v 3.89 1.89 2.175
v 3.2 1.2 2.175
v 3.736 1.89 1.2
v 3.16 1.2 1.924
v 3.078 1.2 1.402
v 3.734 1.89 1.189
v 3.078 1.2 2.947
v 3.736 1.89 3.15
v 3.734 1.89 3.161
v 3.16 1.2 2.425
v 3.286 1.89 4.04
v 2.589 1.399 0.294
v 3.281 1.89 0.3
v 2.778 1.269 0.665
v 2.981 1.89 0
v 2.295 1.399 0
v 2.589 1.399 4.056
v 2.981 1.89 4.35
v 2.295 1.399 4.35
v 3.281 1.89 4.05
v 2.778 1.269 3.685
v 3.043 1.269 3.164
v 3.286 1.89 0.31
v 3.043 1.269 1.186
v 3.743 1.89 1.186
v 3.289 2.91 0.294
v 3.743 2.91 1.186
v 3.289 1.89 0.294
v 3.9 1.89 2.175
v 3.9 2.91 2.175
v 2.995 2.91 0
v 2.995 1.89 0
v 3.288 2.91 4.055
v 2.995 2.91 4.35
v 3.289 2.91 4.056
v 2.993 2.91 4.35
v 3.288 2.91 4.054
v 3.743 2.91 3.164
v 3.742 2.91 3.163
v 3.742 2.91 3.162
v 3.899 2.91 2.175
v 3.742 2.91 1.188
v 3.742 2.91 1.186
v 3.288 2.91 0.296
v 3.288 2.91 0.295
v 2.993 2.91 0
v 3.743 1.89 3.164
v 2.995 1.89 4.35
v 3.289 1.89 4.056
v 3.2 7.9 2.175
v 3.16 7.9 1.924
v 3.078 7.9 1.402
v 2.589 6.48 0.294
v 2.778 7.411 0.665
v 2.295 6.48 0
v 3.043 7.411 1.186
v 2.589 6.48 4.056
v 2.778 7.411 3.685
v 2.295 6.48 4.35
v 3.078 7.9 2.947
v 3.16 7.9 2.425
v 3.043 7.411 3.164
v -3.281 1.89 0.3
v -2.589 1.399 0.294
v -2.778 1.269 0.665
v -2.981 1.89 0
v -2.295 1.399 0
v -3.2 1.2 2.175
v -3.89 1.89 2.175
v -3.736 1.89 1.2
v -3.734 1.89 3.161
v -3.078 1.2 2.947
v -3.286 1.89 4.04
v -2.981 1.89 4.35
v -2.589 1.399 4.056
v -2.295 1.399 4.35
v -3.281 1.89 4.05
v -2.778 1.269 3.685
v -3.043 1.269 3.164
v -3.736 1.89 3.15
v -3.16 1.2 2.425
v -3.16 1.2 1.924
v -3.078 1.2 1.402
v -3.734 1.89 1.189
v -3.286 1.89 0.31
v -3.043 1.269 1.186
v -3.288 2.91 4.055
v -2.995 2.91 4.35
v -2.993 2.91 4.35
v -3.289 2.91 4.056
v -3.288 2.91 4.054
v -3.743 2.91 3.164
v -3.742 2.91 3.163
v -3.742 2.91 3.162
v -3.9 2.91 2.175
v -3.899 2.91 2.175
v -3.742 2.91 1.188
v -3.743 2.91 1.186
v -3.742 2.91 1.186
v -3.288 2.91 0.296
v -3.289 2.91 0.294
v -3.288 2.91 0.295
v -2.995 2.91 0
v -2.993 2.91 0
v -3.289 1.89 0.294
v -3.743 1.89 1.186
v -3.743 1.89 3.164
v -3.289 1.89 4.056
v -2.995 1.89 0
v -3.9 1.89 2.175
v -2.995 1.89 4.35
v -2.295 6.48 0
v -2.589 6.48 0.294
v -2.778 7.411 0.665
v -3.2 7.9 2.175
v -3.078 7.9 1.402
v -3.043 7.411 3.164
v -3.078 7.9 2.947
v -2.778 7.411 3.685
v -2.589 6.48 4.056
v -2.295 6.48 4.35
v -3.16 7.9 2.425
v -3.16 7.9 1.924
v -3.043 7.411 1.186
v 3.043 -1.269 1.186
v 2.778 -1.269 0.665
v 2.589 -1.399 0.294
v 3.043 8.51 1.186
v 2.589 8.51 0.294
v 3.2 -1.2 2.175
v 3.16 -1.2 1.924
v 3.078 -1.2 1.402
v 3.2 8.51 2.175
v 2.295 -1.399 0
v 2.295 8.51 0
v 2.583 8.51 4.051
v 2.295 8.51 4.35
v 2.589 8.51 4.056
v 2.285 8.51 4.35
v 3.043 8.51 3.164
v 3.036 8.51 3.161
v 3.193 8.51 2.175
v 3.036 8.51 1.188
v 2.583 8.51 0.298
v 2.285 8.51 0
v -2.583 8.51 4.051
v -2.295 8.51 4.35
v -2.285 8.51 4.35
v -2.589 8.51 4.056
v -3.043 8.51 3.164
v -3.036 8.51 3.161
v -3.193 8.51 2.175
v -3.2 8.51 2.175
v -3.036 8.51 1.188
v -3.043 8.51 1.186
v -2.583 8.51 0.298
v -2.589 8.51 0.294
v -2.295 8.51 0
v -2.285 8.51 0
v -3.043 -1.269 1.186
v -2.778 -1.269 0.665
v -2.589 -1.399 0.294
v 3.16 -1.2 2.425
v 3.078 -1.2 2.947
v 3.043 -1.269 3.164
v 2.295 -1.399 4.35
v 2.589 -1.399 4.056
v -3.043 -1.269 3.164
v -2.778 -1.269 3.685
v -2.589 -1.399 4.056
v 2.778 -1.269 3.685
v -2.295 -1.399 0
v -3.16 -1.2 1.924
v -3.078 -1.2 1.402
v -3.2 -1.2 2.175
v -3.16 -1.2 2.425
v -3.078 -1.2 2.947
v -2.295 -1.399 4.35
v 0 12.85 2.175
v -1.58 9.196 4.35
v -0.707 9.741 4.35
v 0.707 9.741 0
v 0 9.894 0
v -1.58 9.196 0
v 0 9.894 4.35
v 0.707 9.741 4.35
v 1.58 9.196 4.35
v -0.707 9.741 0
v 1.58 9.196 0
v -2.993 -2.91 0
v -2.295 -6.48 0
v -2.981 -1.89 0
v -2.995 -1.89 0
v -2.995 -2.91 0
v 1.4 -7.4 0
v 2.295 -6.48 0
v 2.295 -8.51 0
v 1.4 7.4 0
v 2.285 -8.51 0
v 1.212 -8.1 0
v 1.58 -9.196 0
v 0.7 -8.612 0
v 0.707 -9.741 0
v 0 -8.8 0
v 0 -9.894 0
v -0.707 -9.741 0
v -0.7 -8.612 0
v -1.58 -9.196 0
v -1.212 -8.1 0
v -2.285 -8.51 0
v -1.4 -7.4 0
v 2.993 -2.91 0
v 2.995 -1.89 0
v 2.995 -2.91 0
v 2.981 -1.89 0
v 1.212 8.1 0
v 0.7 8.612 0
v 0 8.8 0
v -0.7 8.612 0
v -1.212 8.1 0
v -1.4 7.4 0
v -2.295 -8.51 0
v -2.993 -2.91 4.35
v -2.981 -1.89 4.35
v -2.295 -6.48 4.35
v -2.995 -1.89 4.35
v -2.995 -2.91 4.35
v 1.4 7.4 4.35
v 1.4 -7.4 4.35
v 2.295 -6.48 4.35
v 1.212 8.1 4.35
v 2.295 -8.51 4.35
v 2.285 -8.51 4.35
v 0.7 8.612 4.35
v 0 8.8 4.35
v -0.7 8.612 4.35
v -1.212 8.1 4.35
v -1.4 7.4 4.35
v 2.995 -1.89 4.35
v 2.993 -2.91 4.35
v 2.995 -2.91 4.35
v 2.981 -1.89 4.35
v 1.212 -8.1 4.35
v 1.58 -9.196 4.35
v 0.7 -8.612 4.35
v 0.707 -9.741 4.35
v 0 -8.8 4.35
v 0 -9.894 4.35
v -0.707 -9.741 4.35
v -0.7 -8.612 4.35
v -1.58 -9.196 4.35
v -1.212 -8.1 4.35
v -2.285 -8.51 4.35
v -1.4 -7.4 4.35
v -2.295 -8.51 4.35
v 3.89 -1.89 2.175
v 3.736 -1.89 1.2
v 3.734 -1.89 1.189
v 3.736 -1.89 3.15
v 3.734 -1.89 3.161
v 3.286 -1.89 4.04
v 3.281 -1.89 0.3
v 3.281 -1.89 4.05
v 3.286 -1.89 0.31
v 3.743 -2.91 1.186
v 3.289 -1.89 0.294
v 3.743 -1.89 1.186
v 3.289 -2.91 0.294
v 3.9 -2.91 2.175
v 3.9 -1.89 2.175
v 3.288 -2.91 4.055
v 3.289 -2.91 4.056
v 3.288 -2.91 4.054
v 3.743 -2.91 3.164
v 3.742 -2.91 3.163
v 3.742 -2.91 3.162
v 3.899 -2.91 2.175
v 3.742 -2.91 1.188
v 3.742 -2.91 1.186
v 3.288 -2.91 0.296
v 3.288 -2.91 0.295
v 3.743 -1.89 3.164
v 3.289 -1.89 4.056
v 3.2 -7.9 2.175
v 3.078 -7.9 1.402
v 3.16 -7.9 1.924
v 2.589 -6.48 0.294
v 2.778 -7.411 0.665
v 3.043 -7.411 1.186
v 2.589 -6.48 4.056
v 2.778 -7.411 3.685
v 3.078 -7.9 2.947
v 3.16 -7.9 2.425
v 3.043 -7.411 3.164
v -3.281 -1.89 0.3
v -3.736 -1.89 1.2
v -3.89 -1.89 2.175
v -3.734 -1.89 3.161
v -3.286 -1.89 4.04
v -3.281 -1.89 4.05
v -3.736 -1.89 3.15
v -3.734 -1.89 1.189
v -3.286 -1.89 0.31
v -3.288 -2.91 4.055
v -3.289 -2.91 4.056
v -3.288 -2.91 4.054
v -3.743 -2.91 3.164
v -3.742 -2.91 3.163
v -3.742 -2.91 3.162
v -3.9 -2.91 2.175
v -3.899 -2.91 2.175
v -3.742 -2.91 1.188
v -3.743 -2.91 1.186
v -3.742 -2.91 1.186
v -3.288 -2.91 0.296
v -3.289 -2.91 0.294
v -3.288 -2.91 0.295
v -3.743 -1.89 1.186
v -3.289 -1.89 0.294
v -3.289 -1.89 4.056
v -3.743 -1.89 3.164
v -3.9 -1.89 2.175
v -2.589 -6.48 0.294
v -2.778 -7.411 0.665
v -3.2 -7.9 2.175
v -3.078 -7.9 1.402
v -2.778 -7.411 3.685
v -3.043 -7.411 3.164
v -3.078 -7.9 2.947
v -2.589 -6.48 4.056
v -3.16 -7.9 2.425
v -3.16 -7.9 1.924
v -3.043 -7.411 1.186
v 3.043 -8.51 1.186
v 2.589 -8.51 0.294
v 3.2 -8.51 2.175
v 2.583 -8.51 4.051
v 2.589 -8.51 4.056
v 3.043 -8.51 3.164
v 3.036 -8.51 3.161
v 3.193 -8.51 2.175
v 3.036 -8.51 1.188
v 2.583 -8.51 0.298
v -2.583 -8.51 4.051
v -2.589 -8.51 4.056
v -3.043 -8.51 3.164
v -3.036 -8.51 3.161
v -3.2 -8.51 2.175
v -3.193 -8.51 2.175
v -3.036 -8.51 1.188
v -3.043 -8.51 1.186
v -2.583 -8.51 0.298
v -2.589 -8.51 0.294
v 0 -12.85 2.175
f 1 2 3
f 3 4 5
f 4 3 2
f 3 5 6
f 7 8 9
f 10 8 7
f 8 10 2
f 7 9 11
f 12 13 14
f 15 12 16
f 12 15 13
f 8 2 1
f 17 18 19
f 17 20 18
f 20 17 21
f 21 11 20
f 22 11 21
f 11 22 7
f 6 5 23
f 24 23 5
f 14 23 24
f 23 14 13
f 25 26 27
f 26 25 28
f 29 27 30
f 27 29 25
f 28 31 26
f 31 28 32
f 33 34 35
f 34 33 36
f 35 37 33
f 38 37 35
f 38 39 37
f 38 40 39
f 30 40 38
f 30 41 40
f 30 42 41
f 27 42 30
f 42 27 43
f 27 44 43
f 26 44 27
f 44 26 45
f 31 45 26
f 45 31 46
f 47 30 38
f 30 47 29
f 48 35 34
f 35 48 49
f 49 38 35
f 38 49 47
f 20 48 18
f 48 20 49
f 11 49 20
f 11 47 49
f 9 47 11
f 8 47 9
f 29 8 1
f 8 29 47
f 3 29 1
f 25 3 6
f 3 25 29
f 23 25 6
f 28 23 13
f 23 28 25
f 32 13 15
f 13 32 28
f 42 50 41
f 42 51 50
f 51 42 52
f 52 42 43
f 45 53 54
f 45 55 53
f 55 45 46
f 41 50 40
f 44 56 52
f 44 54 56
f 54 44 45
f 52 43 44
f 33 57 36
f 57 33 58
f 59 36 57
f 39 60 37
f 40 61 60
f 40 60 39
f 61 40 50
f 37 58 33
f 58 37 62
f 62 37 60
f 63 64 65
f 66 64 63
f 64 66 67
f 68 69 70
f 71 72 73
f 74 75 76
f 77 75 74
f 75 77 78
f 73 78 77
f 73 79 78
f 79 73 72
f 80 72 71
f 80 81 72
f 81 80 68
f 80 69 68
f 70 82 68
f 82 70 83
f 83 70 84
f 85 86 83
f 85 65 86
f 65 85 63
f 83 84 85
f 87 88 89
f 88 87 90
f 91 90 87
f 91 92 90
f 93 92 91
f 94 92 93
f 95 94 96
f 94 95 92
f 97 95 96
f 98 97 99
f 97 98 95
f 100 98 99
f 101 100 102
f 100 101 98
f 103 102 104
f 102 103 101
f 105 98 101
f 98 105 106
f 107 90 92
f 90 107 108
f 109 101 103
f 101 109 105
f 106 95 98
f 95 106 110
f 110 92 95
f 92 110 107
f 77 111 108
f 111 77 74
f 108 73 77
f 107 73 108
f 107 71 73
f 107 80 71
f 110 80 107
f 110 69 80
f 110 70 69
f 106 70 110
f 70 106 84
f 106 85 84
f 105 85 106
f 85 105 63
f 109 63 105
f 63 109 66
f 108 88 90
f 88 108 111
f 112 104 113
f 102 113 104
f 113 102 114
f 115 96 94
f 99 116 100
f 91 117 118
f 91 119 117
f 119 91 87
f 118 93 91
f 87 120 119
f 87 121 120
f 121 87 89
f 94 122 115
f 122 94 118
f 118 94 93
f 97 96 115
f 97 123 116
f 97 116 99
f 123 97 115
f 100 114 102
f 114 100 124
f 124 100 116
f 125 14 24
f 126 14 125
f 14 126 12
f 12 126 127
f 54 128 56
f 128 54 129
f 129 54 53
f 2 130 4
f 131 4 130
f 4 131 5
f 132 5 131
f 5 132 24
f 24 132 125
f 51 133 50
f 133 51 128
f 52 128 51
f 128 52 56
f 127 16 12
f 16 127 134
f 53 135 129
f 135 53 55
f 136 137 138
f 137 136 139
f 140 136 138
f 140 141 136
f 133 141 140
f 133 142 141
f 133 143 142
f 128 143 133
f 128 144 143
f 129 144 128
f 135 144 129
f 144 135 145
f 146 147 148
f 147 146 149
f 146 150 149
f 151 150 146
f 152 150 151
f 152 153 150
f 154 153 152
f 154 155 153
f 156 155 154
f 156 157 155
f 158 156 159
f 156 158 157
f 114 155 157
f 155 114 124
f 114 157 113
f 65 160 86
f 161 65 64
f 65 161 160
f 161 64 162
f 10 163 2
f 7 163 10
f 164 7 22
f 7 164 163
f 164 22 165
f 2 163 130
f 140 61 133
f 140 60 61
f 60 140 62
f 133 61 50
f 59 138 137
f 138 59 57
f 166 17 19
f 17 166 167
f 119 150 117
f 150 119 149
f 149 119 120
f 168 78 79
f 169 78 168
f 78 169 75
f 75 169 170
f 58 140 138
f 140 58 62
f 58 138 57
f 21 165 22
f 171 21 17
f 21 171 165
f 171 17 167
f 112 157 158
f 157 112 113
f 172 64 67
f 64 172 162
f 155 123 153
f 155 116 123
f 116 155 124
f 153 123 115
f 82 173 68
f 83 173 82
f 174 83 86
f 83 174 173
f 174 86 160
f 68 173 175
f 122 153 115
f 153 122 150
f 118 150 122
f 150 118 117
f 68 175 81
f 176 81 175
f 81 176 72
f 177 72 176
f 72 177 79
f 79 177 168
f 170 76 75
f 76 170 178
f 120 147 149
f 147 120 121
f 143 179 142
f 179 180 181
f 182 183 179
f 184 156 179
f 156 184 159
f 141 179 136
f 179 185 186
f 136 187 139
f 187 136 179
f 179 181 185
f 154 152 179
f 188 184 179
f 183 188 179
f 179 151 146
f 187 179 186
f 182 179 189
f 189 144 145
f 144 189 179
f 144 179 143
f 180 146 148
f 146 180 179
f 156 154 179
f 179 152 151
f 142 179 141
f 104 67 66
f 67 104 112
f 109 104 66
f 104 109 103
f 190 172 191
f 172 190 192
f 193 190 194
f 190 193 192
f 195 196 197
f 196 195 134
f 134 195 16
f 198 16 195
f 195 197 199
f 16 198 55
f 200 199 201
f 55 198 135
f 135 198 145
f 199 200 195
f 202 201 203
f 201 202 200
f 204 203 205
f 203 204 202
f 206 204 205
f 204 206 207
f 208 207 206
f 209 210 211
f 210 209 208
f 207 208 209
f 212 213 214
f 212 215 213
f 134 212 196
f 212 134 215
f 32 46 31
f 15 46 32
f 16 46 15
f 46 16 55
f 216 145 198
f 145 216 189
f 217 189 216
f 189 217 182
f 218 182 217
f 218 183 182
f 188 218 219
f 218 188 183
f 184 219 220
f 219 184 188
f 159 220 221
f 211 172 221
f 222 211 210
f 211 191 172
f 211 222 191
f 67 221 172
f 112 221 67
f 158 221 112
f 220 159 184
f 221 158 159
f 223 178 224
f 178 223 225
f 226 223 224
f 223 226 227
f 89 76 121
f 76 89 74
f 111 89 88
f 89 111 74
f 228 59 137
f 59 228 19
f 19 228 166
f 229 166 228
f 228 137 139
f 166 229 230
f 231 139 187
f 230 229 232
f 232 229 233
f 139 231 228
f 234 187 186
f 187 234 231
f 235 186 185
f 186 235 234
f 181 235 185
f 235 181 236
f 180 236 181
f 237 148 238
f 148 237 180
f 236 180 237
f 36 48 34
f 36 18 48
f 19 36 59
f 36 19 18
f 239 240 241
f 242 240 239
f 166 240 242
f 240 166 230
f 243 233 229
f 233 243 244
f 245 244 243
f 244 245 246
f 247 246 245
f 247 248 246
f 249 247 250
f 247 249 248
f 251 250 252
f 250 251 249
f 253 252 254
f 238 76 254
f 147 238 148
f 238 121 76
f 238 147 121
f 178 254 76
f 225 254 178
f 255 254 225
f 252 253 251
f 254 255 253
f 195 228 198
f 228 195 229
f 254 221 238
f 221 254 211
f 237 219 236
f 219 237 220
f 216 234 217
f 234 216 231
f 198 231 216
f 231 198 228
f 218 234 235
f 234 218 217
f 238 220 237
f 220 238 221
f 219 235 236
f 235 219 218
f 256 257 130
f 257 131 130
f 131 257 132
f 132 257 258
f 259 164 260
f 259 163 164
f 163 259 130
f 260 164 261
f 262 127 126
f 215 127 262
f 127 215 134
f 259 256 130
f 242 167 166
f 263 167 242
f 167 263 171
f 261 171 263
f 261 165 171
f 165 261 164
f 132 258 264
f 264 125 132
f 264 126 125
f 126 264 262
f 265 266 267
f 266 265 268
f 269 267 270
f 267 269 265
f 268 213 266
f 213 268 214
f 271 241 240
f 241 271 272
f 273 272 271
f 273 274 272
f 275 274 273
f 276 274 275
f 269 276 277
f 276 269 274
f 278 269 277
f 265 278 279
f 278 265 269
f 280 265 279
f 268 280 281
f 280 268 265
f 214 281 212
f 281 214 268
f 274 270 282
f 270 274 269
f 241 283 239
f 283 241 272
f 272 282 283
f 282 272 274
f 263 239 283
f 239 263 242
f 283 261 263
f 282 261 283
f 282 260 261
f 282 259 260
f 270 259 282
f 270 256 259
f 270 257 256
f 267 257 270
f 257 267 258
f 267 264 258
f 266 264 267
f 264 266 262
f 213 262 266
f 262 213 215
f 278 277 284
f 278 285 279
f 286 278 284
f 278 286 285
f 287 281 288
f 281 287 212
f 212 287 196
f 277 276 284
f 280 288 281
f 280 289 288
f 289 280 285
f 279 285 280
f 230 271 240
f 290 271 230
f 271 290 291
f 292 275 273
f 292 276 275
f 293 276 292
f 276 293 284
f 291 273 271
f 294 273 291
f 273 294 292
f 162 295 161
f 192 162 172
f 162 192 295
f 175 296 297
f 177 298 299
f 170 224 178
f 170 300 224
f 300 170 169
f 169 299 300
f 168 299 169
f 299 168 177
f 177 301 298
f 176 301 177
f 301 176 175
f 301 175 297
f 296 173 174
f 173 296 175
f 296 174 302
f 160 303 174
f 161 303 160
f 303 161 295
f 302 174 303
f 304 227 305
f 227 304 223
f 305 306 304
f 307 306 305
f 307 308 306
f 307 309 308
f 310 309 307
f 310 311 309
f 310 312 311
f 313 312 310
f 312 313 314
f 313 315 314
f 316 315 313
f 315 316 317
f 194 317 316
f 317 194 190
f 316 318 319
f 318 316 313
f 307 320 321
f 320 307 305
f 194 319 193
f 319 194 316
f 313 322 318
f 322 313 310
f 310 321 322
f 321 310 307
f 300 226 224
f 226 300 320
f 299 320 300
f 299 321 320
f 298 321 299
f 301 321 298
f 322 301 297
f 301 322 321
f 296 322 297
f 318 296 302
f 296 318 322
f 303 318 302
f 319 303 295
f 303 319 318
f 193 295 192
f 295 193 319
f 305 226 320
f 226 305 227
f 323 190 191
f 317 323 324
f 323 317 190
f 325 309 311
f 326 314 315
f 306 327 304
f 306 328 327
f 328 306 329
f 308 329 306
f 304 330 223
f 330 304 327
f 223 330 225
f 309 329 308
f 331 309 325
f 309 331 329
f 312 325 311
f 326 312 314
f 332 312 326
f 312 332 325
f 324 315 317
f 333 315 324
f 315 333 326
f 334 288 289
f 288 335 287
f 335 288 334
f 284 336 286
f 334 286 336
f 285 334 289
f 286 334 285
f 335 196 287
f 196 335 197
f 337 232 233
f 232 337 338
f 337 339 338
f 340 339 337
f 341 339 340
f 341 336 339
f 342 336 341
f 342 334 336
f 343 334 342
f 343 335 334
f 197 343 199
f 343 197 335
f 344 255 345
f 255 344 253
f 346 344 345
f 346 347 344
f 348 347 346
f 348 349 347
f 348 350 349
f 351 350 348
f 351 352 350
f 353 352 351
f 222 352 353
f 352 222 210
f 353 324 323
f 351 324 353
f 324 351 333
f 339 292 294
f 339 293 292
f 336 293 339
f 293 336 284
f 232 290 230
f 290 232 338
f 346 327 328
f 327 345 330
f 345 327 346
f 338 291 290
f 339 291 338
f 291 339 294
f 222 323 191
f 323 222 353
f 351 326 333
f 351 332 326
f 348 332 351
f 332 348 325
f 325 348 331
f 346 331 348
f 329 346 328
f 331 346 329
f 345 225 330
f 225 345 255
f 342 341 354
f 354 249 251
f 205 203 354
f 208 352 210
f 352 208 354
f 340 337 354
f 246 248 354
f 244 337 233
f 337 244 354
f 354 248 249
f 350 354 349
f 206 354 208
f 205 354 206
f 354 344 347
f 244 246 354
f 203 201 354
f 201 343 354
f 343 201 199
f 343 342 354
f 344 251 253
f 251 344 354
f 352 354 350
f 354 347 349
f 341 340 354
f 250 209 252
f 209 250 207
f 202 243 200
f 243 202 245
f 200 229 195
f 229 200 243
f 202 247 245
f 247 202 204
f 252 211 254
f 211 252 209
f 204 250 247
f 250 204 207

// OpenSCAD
// [FL_INDEX: keywords="openscad, 3d_parametric, Parametric_Snap_Pins, csg_solid" | COT="Parametric OpenSCAD design from 3DCodeverse"]
// Title: Parametric Snap Pins

// new pin connectors

object=0;//[0:Pinpeg,1:Pinhole]
//Pinpeg is twice this length
length=13;
//Of hole; pinpeg is smaller to fit
diameter=7;
//Only affects pinhole
hole_twist=0;//[0:free,1:fixed]
//Pulls the snaps together on the pinpeg to ensure a tight coupling
preload=0.1;
//Allows pins to fit easily into holes
clearance=0.3;
//Thicker makes the pinpeg stiffer
thickness=1.8;
//Height of snap nubs
snap=0.4;
//Put fins on pinhole to help with printing strength
fins=1;//[1:yes,0:no]

$fn=20;

if(object==0)pinpeg(r=diameter/2,l=length,d=2.5-preload,nub=snap,t=thickness,space=clearance);
if(object==1)pinhole(r=diameter/2,l=length,nub=snap,fixed=hole_twist,fins=fins);

//pin(flat=0);
//%pinhole(fixed=true);

//pinpeg();
//translate([10,0,0])difference(){
//	cylinder(r=5.5,h=14);
//	pinhole(fixed=true);
//}
//translate([-10,0,0])difference(){
//	cylinder(r=5.5,h=14);
//	pinhole(fixed=false);
//}

module pin(r=3.5,l=13,d=2.4,slot=10,nub=0.4,t=1.8,space=0.3,flat=1)
translate(flat*[0,0,r/sqrt(2)-space])rotate((1-flat)*[90,0,0])
difference(){
	rotate([-90,0,0])intersection(){
		union(){
			translate([0,0,-0.01])cylinder(r=r-space,h=l-r-0.98);
			translate([0,0,l-r-1])cylinder(r1=r-space,r2=0,h=r-space/2+1);
			translate([nub+space,0,d])nub(r-space,nub+space);
			translate([-nub-space,0,d])nub(r-space,nub+space);
		}
		cube([3*r,r*sqrt(2)-2*space,2*l+3*r],center=true);
	}
	translate([0,d,0])cube([2*(r-t-space),slot,2*r],center=true);
	translate([0,d-slot/2,0])cylinder(r=r-t-space,h=2*r,center=true,$fn=12);
	translate([0,d+slot/2,0])cylinder(r=r-t-space,h=2*r,center=true,$fn=12);
}

module nub(r,nub)
union(){
	translate([0,0,-nub-0.5])cylinder(r1=r-nub,r2=r,h=nub);
	cylinder(r=r,h=1.02,center=true);
	translate([0,0,0.5])cylinder(r1=r,r2=r-nub,h=5);
}

module pinhole(r=3.5,l=13,d=2.5,nub=0.4,fixed=false,fins=true)
intersection(){
	union(){
		translate([0,0,-0.1])cylinder(r=r,h=l-r+0.1);
		translate([0,0,l-r-0.01])cylinder(r1=r,r2=0,h=r);
		translate([0,0,d])nub(r+nub,nub);
		if(fins)translate([0,0,l-r]){
			cube([2*r,0.01,2*r],center=true);
			cube([0.01,2*r,2*r],center=true);
		}
	}
	if(fixed)cube([3*r,r*sqrt(2),2*l+3*r],center=true);
}

module pinpeg(r=3.5,l=13,d=2.4,nub=0.4,t=1.8,space=0.3)
union(){
	pin(r=r,l=l,d=d,nub=nub,t=t,space=space,flat=1);
	mirror([0,1,0])pin(r=r,l=l,d=d,nub=nub,t=t,space=space,flat=1);
}
